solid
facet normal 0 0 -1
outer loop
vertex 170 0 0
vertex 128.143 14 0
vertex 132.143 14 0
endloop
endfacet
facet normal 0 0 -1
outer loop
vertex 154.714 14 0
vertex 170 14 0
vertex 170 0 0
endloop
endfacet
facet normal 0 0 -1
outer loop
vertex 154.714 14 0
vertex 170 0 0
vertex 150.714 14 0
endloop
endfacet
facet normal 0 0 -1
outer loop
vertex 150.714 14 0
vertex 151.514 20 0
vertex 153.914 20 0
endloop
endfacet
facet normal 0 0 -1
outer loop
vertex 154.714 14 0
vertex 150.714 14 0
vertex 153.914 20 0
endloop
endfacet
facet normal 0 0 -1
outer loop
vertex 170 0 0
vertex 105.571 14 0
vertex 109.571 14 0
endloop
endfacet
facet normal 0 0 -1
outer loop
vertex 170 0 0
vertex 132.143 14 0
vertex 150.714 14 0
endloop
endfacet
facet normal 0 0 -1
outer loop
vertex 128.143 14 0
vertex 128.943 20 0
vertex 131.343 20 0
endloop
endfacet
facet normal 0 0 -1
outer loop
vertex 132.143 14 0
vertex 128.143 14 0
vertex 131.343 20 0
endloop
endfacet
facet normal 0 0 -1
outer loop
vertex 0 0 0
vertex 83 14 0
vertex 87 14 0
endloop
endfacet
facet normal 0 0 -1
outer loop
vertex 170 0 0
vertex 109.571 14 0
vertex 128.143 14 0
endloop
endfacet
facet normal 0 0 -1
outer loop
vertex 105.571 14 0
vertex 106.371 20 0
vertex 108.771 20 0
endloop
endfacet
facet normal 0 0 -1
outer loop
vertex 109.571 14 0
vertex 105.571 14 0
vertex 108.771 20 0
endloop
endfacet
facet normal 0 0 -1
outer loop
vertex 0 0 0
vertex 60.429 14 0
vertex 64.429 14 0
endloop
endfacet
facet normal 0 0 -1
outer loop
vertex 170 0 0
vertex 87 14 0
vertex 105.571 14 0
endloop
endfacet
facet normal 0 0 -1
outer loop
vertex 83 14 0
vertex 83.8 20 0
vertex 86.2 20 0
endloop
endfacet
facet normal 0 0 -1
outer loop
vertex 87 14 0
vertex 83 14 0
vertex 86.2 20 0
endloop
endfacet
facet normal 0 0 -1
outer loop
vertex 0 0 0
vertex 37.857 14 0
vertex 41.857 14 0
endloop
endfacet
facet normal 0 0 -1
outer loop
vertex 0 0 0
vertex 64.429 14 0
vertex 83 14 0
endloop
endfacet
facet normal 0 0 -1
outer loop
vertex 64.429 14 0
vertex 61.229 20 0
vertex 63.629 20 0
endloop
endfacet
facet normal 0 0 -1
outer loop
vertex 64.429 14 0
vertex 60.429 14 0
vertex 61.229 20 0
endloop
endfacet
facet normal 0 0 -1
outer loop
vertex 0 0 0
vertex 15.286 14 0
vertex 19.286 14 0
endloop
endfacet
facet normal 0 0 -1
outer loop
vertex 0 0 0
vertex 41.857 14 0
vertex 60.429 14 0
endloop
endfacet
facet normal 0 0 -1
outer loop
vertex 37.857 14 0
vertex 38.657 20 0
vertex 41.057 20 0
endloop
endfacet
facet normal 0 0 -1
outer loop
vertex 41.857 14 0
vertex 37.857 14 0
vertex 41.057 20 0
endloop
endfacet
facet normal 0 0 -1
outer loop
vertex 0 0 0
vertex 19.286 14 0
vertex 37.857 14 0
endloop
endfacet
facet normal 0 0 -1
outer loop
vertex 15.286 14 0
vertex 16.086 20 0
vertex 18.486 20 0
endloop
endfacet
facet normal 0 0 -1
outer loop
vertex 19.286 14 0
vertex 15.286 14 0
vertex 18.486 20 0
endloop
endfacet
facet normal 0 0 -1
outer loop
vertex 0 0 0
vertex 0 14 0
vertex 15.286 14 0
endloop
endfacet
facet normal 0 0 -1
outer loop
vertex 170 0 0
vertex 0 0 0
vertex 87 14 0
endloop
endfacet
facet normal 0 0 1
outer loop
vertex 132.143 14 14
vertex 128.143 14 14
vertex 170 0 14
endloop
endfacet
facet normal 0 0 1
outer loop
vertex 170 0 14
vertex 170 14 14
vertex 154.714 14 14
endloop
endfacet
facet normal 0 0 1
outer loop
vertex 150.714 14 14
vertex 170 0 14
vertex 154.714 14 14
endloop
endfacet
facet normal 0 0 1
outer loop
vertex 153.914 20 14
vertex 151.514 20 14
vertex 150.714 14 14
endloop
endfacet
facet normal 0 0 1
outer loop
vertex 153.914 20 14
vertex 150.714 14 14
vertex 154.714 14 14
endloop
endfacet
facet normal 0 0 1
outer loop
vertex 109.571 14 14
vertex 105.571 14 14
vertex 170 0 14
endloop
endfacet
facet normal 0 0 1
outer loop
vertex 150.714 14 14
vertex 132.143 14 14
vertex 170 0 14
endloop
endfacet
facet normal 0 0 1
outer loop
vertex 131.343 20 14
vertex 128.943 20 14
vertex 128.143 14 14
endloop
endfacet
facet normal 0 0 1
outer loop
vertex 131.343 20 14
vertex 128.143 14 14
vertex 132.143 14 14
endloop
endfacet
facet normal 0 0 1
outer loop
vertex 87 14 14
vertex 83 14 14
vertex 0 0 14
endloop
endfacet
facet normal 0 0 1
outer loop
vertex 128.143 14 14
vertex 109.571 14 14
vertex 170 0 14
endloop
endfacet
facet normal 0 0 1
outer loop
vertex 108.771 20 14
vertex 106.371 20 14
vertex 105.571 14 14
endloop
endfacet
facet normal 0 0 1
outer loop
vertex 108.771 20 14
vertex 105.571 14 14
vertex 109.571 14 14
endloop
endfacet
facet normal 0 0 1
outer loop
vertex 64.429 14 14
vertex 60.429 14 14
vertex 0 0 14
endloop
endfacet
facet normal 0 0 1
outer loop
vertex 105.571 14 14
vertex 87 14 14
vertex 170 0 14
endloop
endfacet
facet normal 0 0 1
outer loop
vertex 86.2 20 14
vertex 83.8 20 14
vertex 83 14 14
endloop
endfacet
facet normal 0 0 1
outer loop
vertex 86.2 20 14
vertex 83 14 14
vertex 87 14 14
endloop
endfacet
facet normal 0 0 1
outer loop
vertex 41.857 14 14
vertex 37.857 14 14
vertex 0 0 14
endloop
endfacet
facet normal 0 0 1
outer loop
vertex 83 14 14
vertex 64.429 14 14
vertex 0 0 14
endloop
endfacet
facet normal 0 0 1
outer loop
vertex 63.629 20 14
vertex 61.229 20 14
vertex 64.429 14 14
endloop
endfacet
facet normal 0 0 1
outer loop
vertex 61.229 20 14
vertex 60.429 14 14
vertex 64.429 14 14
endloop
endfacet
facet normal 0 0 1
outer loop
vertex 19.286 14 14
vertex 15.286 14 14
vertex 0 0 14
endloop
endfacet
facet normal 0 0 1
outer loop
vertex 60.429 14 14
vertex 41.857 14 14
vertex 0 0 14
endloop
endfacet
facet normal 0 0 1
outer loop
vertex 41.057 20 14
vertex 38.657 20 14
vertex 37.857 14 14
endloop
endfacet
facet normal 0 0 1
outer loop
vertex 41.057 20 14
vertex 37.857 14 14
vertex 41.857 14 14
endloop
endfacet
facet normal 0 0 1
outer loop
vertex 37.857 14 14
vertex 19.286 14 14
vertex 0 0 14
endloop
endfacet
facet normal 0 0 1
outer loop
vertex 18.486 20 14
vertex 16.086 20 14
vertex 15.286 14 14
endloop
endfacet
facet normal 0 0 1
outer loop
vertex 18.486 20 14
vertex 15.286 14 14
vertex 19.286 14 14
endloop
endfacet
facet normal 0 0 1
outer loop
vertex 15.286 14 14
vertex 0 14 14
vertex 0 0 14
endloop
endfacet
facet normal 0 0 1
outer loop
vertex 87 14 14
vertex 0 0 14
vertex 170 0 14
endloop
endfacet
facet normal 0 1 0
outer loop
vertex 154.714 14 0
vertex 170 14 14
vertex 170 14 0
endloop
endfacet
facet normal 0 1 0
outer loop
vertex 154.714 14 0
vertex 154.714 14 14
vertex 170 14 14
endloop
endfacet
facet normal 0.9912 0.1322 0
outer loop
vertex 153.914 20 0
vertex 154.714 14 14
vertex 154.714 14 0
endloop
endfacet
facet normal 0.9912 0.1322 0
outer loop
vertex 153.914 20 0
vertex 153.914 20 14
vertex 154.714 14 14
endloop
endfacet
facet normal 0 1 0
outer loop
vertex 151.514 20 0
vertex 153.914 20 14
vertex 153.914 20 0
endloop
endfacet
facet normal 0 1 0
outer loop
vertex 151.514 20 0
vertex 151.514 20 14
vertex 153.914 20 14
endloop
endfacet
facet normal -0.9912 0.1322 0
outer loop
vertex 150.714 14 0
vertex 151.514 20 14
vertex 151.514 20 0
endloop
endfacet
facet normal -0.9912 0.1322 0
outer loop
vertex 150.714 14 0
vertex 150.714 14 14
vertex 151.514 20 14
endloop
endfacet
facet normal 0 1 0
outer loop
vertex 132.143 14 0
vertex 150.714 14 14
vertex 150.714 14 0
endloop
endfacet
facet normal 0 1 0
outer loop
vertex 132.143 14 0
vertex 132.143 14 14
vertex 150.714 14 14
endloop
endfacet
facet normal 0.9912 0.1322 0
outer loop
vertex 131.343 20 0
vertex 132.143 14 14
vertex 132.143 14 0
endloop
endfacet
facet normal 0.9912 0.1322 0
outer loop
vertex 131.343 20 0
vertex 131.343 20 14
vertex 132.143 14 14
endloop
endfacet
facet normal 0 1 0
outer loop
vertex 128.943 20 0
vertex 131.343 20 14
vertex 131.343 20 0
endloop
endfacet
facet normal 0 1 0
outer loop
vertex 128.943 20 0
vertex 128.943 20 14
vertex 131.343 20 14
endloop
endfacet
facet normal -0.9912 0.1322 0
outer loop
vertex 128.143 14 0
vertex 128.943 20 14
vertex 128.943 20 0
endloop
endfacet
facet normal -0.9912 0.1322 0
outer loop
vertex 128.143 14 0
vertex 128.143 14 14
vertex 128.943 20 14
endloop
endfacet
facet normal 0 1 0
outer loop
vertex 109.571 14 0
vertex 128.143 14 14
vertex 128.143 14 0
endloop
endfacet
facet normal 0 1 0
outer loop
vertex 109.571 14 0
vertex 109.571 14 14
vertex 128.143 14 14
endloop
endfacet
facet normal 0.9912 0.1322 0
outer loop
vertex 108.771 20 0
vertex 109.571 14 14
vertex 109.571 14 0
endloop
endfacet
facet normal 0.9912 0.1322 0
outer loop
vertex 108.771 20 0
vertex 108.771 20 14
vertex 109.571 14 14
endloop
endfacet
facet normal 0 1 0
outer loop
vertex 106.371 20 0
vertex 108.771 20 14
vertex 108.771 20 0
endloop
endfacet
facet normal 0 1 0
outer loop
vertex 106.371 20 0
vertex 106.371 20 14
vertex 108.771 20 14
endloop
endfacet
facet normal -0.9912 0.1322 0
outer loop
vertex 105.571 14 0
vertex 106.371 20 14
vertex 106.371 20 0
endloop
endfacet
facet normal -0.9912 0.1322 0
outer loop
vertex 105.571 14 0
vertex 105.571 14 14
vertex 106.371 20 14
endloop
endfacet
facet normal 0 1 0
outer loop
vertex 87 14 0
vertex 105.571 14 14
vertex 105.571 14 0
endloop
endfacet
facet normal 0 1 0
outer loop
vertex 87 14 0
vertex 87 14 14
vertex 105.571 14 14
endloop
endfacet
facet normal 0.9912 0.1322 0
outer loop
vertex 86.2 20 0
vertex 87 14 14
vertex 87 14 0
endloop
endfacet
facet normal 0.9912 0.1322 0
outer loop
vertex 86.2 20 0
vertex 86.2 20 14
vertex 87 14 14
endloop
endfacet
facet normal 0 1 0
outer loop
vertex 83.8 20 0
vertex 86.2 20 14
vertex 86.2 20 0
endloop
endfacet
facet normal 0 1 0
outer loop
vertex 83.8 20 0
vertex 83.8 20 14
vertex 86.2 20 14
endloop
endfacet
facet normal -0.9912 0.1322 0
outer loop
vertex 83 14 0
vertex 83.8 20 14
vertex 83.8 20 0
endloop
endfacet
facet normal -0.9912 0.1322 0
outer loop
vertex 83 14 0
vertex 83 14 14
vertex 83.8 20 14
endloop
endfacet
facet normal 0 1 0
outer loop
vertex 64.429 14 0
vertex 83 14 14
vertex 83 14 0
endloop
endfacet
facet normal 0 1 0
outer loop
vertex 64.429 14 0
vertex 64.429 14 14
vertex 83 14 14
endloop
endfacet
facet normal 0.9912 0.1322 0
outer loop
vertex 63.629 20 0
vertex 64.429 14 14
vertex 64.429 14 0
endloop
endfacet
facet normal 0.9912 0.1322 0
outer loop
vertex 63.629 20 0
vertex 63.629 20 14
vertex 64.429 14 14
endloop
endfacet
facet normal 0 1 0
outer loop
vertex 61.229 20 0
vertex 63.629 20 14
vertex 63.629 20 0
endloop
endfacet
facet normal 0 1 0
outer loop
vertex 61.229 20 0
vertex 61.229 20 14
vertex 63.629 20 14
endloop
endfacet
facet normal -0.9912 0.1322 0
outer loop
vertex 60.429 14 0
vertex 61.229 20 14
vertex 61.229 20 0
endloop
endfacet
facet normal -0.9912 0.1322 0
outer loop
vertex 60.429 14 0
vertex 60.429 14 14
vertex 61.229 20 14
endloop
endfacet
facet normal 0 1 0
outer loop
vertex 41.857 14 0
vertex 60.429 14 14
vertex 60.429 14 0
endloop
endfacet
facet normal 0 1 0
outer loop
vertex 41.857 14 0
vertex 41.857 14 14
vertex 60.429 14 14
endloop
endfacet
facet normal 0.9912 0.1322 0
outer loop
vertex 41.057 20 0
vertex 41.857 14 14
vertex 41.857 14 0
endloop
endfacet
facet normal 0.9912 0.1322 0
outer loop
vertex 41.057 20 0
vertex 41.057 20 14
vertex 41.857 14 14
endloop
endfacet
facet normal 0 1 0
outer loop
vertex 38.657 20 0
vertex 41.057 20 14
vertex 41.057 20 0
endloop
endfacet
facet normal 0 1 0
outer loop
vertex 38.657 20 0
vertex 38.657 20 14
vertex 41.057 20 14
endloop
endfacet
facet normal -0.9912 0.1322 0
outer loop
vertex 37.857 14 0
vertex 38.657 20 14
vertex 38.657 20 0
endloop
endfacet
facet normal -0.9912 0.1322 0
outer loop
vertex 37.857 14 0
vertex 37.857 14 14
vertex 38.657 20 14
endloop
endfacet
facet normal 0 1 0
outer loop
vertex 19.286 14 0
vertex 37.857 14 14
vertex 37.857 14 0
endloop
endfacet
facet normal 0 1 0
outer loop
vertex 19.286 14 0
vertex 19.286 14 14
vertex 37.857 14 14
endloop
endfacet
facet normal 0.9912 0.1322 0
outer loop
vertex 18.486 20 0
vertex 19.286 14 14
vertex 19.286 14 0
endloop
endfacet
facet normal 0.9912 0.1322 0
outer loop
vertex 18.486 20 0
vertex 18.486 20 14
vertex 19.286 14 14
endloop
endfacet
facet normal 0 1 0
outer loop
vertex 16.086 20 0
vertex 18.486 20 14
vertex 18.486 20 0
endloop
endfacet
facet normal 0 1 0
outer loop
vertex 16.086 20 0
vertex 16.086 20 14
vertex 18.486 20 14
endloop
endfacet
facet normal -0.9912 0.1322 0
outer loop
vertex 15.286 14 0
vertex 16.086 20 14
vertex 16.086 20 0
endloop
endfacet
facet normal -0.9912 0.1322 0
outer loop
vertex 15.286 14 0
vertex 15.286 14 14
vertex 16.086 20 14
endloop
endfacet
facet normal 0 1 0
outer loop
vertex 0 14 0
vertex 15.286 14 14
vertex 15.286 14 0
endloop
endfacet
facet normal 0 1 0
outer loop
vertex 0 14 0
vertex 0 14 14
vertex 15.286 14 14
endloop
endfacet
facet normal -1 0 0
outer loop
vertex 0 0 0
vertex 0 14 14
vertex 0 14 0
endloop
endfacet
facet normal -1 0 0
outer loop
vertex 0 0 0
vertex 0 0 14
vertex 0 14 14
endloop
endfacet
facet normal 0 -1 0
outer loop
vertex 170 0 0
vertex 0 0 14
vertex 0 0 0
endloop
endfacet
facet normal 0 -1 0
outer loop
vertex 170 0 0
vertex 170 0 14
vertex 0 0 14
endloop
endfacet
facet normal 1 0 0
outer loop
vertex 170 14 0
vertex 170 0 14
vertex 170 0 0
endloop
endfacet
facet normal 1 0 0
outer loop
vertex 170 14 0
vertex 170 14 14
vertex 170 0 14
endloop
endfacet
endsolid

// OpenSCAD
$fn = 32;

// ----------------------------------------------------------------------
// Gear rack: 7 teeth on a 170 mm bar, pitch 22.57 mm
// ----------------------------------------------------------------------

// --- parameters (mm) ---
profile_height = 14;      // extrusion height
profile_points = 32;      // points of the closed outline

profile = [[0, 0], [170, 0], [170, 14], [154.714, 14], [153.914, 20], [151.514, 20], [150.714, 14], [132.143, 14], [131.343, 20], [128.943, 20], [128.143, 14], [109.571, 14], [108.771, 20], [106.371, 20], [105.571, 14], [87, 14], [86.2, 20], [83.8, 20], [83, 14], [64.429, 14], [63.629, 20], [61.229, 20], [60.429, 14], [41.857, 14], [41.057, 20], [38.657, 20], [37.857, 14], [19.286, 14], [18.486, 20], [16.086, 20], [15.286, 14], [0, 14]];  // single closed polygon, 32 points, counter clockwise

// --- the one profile operation ---
linear_extrude(height = profile_height) polygon(points = profile);
